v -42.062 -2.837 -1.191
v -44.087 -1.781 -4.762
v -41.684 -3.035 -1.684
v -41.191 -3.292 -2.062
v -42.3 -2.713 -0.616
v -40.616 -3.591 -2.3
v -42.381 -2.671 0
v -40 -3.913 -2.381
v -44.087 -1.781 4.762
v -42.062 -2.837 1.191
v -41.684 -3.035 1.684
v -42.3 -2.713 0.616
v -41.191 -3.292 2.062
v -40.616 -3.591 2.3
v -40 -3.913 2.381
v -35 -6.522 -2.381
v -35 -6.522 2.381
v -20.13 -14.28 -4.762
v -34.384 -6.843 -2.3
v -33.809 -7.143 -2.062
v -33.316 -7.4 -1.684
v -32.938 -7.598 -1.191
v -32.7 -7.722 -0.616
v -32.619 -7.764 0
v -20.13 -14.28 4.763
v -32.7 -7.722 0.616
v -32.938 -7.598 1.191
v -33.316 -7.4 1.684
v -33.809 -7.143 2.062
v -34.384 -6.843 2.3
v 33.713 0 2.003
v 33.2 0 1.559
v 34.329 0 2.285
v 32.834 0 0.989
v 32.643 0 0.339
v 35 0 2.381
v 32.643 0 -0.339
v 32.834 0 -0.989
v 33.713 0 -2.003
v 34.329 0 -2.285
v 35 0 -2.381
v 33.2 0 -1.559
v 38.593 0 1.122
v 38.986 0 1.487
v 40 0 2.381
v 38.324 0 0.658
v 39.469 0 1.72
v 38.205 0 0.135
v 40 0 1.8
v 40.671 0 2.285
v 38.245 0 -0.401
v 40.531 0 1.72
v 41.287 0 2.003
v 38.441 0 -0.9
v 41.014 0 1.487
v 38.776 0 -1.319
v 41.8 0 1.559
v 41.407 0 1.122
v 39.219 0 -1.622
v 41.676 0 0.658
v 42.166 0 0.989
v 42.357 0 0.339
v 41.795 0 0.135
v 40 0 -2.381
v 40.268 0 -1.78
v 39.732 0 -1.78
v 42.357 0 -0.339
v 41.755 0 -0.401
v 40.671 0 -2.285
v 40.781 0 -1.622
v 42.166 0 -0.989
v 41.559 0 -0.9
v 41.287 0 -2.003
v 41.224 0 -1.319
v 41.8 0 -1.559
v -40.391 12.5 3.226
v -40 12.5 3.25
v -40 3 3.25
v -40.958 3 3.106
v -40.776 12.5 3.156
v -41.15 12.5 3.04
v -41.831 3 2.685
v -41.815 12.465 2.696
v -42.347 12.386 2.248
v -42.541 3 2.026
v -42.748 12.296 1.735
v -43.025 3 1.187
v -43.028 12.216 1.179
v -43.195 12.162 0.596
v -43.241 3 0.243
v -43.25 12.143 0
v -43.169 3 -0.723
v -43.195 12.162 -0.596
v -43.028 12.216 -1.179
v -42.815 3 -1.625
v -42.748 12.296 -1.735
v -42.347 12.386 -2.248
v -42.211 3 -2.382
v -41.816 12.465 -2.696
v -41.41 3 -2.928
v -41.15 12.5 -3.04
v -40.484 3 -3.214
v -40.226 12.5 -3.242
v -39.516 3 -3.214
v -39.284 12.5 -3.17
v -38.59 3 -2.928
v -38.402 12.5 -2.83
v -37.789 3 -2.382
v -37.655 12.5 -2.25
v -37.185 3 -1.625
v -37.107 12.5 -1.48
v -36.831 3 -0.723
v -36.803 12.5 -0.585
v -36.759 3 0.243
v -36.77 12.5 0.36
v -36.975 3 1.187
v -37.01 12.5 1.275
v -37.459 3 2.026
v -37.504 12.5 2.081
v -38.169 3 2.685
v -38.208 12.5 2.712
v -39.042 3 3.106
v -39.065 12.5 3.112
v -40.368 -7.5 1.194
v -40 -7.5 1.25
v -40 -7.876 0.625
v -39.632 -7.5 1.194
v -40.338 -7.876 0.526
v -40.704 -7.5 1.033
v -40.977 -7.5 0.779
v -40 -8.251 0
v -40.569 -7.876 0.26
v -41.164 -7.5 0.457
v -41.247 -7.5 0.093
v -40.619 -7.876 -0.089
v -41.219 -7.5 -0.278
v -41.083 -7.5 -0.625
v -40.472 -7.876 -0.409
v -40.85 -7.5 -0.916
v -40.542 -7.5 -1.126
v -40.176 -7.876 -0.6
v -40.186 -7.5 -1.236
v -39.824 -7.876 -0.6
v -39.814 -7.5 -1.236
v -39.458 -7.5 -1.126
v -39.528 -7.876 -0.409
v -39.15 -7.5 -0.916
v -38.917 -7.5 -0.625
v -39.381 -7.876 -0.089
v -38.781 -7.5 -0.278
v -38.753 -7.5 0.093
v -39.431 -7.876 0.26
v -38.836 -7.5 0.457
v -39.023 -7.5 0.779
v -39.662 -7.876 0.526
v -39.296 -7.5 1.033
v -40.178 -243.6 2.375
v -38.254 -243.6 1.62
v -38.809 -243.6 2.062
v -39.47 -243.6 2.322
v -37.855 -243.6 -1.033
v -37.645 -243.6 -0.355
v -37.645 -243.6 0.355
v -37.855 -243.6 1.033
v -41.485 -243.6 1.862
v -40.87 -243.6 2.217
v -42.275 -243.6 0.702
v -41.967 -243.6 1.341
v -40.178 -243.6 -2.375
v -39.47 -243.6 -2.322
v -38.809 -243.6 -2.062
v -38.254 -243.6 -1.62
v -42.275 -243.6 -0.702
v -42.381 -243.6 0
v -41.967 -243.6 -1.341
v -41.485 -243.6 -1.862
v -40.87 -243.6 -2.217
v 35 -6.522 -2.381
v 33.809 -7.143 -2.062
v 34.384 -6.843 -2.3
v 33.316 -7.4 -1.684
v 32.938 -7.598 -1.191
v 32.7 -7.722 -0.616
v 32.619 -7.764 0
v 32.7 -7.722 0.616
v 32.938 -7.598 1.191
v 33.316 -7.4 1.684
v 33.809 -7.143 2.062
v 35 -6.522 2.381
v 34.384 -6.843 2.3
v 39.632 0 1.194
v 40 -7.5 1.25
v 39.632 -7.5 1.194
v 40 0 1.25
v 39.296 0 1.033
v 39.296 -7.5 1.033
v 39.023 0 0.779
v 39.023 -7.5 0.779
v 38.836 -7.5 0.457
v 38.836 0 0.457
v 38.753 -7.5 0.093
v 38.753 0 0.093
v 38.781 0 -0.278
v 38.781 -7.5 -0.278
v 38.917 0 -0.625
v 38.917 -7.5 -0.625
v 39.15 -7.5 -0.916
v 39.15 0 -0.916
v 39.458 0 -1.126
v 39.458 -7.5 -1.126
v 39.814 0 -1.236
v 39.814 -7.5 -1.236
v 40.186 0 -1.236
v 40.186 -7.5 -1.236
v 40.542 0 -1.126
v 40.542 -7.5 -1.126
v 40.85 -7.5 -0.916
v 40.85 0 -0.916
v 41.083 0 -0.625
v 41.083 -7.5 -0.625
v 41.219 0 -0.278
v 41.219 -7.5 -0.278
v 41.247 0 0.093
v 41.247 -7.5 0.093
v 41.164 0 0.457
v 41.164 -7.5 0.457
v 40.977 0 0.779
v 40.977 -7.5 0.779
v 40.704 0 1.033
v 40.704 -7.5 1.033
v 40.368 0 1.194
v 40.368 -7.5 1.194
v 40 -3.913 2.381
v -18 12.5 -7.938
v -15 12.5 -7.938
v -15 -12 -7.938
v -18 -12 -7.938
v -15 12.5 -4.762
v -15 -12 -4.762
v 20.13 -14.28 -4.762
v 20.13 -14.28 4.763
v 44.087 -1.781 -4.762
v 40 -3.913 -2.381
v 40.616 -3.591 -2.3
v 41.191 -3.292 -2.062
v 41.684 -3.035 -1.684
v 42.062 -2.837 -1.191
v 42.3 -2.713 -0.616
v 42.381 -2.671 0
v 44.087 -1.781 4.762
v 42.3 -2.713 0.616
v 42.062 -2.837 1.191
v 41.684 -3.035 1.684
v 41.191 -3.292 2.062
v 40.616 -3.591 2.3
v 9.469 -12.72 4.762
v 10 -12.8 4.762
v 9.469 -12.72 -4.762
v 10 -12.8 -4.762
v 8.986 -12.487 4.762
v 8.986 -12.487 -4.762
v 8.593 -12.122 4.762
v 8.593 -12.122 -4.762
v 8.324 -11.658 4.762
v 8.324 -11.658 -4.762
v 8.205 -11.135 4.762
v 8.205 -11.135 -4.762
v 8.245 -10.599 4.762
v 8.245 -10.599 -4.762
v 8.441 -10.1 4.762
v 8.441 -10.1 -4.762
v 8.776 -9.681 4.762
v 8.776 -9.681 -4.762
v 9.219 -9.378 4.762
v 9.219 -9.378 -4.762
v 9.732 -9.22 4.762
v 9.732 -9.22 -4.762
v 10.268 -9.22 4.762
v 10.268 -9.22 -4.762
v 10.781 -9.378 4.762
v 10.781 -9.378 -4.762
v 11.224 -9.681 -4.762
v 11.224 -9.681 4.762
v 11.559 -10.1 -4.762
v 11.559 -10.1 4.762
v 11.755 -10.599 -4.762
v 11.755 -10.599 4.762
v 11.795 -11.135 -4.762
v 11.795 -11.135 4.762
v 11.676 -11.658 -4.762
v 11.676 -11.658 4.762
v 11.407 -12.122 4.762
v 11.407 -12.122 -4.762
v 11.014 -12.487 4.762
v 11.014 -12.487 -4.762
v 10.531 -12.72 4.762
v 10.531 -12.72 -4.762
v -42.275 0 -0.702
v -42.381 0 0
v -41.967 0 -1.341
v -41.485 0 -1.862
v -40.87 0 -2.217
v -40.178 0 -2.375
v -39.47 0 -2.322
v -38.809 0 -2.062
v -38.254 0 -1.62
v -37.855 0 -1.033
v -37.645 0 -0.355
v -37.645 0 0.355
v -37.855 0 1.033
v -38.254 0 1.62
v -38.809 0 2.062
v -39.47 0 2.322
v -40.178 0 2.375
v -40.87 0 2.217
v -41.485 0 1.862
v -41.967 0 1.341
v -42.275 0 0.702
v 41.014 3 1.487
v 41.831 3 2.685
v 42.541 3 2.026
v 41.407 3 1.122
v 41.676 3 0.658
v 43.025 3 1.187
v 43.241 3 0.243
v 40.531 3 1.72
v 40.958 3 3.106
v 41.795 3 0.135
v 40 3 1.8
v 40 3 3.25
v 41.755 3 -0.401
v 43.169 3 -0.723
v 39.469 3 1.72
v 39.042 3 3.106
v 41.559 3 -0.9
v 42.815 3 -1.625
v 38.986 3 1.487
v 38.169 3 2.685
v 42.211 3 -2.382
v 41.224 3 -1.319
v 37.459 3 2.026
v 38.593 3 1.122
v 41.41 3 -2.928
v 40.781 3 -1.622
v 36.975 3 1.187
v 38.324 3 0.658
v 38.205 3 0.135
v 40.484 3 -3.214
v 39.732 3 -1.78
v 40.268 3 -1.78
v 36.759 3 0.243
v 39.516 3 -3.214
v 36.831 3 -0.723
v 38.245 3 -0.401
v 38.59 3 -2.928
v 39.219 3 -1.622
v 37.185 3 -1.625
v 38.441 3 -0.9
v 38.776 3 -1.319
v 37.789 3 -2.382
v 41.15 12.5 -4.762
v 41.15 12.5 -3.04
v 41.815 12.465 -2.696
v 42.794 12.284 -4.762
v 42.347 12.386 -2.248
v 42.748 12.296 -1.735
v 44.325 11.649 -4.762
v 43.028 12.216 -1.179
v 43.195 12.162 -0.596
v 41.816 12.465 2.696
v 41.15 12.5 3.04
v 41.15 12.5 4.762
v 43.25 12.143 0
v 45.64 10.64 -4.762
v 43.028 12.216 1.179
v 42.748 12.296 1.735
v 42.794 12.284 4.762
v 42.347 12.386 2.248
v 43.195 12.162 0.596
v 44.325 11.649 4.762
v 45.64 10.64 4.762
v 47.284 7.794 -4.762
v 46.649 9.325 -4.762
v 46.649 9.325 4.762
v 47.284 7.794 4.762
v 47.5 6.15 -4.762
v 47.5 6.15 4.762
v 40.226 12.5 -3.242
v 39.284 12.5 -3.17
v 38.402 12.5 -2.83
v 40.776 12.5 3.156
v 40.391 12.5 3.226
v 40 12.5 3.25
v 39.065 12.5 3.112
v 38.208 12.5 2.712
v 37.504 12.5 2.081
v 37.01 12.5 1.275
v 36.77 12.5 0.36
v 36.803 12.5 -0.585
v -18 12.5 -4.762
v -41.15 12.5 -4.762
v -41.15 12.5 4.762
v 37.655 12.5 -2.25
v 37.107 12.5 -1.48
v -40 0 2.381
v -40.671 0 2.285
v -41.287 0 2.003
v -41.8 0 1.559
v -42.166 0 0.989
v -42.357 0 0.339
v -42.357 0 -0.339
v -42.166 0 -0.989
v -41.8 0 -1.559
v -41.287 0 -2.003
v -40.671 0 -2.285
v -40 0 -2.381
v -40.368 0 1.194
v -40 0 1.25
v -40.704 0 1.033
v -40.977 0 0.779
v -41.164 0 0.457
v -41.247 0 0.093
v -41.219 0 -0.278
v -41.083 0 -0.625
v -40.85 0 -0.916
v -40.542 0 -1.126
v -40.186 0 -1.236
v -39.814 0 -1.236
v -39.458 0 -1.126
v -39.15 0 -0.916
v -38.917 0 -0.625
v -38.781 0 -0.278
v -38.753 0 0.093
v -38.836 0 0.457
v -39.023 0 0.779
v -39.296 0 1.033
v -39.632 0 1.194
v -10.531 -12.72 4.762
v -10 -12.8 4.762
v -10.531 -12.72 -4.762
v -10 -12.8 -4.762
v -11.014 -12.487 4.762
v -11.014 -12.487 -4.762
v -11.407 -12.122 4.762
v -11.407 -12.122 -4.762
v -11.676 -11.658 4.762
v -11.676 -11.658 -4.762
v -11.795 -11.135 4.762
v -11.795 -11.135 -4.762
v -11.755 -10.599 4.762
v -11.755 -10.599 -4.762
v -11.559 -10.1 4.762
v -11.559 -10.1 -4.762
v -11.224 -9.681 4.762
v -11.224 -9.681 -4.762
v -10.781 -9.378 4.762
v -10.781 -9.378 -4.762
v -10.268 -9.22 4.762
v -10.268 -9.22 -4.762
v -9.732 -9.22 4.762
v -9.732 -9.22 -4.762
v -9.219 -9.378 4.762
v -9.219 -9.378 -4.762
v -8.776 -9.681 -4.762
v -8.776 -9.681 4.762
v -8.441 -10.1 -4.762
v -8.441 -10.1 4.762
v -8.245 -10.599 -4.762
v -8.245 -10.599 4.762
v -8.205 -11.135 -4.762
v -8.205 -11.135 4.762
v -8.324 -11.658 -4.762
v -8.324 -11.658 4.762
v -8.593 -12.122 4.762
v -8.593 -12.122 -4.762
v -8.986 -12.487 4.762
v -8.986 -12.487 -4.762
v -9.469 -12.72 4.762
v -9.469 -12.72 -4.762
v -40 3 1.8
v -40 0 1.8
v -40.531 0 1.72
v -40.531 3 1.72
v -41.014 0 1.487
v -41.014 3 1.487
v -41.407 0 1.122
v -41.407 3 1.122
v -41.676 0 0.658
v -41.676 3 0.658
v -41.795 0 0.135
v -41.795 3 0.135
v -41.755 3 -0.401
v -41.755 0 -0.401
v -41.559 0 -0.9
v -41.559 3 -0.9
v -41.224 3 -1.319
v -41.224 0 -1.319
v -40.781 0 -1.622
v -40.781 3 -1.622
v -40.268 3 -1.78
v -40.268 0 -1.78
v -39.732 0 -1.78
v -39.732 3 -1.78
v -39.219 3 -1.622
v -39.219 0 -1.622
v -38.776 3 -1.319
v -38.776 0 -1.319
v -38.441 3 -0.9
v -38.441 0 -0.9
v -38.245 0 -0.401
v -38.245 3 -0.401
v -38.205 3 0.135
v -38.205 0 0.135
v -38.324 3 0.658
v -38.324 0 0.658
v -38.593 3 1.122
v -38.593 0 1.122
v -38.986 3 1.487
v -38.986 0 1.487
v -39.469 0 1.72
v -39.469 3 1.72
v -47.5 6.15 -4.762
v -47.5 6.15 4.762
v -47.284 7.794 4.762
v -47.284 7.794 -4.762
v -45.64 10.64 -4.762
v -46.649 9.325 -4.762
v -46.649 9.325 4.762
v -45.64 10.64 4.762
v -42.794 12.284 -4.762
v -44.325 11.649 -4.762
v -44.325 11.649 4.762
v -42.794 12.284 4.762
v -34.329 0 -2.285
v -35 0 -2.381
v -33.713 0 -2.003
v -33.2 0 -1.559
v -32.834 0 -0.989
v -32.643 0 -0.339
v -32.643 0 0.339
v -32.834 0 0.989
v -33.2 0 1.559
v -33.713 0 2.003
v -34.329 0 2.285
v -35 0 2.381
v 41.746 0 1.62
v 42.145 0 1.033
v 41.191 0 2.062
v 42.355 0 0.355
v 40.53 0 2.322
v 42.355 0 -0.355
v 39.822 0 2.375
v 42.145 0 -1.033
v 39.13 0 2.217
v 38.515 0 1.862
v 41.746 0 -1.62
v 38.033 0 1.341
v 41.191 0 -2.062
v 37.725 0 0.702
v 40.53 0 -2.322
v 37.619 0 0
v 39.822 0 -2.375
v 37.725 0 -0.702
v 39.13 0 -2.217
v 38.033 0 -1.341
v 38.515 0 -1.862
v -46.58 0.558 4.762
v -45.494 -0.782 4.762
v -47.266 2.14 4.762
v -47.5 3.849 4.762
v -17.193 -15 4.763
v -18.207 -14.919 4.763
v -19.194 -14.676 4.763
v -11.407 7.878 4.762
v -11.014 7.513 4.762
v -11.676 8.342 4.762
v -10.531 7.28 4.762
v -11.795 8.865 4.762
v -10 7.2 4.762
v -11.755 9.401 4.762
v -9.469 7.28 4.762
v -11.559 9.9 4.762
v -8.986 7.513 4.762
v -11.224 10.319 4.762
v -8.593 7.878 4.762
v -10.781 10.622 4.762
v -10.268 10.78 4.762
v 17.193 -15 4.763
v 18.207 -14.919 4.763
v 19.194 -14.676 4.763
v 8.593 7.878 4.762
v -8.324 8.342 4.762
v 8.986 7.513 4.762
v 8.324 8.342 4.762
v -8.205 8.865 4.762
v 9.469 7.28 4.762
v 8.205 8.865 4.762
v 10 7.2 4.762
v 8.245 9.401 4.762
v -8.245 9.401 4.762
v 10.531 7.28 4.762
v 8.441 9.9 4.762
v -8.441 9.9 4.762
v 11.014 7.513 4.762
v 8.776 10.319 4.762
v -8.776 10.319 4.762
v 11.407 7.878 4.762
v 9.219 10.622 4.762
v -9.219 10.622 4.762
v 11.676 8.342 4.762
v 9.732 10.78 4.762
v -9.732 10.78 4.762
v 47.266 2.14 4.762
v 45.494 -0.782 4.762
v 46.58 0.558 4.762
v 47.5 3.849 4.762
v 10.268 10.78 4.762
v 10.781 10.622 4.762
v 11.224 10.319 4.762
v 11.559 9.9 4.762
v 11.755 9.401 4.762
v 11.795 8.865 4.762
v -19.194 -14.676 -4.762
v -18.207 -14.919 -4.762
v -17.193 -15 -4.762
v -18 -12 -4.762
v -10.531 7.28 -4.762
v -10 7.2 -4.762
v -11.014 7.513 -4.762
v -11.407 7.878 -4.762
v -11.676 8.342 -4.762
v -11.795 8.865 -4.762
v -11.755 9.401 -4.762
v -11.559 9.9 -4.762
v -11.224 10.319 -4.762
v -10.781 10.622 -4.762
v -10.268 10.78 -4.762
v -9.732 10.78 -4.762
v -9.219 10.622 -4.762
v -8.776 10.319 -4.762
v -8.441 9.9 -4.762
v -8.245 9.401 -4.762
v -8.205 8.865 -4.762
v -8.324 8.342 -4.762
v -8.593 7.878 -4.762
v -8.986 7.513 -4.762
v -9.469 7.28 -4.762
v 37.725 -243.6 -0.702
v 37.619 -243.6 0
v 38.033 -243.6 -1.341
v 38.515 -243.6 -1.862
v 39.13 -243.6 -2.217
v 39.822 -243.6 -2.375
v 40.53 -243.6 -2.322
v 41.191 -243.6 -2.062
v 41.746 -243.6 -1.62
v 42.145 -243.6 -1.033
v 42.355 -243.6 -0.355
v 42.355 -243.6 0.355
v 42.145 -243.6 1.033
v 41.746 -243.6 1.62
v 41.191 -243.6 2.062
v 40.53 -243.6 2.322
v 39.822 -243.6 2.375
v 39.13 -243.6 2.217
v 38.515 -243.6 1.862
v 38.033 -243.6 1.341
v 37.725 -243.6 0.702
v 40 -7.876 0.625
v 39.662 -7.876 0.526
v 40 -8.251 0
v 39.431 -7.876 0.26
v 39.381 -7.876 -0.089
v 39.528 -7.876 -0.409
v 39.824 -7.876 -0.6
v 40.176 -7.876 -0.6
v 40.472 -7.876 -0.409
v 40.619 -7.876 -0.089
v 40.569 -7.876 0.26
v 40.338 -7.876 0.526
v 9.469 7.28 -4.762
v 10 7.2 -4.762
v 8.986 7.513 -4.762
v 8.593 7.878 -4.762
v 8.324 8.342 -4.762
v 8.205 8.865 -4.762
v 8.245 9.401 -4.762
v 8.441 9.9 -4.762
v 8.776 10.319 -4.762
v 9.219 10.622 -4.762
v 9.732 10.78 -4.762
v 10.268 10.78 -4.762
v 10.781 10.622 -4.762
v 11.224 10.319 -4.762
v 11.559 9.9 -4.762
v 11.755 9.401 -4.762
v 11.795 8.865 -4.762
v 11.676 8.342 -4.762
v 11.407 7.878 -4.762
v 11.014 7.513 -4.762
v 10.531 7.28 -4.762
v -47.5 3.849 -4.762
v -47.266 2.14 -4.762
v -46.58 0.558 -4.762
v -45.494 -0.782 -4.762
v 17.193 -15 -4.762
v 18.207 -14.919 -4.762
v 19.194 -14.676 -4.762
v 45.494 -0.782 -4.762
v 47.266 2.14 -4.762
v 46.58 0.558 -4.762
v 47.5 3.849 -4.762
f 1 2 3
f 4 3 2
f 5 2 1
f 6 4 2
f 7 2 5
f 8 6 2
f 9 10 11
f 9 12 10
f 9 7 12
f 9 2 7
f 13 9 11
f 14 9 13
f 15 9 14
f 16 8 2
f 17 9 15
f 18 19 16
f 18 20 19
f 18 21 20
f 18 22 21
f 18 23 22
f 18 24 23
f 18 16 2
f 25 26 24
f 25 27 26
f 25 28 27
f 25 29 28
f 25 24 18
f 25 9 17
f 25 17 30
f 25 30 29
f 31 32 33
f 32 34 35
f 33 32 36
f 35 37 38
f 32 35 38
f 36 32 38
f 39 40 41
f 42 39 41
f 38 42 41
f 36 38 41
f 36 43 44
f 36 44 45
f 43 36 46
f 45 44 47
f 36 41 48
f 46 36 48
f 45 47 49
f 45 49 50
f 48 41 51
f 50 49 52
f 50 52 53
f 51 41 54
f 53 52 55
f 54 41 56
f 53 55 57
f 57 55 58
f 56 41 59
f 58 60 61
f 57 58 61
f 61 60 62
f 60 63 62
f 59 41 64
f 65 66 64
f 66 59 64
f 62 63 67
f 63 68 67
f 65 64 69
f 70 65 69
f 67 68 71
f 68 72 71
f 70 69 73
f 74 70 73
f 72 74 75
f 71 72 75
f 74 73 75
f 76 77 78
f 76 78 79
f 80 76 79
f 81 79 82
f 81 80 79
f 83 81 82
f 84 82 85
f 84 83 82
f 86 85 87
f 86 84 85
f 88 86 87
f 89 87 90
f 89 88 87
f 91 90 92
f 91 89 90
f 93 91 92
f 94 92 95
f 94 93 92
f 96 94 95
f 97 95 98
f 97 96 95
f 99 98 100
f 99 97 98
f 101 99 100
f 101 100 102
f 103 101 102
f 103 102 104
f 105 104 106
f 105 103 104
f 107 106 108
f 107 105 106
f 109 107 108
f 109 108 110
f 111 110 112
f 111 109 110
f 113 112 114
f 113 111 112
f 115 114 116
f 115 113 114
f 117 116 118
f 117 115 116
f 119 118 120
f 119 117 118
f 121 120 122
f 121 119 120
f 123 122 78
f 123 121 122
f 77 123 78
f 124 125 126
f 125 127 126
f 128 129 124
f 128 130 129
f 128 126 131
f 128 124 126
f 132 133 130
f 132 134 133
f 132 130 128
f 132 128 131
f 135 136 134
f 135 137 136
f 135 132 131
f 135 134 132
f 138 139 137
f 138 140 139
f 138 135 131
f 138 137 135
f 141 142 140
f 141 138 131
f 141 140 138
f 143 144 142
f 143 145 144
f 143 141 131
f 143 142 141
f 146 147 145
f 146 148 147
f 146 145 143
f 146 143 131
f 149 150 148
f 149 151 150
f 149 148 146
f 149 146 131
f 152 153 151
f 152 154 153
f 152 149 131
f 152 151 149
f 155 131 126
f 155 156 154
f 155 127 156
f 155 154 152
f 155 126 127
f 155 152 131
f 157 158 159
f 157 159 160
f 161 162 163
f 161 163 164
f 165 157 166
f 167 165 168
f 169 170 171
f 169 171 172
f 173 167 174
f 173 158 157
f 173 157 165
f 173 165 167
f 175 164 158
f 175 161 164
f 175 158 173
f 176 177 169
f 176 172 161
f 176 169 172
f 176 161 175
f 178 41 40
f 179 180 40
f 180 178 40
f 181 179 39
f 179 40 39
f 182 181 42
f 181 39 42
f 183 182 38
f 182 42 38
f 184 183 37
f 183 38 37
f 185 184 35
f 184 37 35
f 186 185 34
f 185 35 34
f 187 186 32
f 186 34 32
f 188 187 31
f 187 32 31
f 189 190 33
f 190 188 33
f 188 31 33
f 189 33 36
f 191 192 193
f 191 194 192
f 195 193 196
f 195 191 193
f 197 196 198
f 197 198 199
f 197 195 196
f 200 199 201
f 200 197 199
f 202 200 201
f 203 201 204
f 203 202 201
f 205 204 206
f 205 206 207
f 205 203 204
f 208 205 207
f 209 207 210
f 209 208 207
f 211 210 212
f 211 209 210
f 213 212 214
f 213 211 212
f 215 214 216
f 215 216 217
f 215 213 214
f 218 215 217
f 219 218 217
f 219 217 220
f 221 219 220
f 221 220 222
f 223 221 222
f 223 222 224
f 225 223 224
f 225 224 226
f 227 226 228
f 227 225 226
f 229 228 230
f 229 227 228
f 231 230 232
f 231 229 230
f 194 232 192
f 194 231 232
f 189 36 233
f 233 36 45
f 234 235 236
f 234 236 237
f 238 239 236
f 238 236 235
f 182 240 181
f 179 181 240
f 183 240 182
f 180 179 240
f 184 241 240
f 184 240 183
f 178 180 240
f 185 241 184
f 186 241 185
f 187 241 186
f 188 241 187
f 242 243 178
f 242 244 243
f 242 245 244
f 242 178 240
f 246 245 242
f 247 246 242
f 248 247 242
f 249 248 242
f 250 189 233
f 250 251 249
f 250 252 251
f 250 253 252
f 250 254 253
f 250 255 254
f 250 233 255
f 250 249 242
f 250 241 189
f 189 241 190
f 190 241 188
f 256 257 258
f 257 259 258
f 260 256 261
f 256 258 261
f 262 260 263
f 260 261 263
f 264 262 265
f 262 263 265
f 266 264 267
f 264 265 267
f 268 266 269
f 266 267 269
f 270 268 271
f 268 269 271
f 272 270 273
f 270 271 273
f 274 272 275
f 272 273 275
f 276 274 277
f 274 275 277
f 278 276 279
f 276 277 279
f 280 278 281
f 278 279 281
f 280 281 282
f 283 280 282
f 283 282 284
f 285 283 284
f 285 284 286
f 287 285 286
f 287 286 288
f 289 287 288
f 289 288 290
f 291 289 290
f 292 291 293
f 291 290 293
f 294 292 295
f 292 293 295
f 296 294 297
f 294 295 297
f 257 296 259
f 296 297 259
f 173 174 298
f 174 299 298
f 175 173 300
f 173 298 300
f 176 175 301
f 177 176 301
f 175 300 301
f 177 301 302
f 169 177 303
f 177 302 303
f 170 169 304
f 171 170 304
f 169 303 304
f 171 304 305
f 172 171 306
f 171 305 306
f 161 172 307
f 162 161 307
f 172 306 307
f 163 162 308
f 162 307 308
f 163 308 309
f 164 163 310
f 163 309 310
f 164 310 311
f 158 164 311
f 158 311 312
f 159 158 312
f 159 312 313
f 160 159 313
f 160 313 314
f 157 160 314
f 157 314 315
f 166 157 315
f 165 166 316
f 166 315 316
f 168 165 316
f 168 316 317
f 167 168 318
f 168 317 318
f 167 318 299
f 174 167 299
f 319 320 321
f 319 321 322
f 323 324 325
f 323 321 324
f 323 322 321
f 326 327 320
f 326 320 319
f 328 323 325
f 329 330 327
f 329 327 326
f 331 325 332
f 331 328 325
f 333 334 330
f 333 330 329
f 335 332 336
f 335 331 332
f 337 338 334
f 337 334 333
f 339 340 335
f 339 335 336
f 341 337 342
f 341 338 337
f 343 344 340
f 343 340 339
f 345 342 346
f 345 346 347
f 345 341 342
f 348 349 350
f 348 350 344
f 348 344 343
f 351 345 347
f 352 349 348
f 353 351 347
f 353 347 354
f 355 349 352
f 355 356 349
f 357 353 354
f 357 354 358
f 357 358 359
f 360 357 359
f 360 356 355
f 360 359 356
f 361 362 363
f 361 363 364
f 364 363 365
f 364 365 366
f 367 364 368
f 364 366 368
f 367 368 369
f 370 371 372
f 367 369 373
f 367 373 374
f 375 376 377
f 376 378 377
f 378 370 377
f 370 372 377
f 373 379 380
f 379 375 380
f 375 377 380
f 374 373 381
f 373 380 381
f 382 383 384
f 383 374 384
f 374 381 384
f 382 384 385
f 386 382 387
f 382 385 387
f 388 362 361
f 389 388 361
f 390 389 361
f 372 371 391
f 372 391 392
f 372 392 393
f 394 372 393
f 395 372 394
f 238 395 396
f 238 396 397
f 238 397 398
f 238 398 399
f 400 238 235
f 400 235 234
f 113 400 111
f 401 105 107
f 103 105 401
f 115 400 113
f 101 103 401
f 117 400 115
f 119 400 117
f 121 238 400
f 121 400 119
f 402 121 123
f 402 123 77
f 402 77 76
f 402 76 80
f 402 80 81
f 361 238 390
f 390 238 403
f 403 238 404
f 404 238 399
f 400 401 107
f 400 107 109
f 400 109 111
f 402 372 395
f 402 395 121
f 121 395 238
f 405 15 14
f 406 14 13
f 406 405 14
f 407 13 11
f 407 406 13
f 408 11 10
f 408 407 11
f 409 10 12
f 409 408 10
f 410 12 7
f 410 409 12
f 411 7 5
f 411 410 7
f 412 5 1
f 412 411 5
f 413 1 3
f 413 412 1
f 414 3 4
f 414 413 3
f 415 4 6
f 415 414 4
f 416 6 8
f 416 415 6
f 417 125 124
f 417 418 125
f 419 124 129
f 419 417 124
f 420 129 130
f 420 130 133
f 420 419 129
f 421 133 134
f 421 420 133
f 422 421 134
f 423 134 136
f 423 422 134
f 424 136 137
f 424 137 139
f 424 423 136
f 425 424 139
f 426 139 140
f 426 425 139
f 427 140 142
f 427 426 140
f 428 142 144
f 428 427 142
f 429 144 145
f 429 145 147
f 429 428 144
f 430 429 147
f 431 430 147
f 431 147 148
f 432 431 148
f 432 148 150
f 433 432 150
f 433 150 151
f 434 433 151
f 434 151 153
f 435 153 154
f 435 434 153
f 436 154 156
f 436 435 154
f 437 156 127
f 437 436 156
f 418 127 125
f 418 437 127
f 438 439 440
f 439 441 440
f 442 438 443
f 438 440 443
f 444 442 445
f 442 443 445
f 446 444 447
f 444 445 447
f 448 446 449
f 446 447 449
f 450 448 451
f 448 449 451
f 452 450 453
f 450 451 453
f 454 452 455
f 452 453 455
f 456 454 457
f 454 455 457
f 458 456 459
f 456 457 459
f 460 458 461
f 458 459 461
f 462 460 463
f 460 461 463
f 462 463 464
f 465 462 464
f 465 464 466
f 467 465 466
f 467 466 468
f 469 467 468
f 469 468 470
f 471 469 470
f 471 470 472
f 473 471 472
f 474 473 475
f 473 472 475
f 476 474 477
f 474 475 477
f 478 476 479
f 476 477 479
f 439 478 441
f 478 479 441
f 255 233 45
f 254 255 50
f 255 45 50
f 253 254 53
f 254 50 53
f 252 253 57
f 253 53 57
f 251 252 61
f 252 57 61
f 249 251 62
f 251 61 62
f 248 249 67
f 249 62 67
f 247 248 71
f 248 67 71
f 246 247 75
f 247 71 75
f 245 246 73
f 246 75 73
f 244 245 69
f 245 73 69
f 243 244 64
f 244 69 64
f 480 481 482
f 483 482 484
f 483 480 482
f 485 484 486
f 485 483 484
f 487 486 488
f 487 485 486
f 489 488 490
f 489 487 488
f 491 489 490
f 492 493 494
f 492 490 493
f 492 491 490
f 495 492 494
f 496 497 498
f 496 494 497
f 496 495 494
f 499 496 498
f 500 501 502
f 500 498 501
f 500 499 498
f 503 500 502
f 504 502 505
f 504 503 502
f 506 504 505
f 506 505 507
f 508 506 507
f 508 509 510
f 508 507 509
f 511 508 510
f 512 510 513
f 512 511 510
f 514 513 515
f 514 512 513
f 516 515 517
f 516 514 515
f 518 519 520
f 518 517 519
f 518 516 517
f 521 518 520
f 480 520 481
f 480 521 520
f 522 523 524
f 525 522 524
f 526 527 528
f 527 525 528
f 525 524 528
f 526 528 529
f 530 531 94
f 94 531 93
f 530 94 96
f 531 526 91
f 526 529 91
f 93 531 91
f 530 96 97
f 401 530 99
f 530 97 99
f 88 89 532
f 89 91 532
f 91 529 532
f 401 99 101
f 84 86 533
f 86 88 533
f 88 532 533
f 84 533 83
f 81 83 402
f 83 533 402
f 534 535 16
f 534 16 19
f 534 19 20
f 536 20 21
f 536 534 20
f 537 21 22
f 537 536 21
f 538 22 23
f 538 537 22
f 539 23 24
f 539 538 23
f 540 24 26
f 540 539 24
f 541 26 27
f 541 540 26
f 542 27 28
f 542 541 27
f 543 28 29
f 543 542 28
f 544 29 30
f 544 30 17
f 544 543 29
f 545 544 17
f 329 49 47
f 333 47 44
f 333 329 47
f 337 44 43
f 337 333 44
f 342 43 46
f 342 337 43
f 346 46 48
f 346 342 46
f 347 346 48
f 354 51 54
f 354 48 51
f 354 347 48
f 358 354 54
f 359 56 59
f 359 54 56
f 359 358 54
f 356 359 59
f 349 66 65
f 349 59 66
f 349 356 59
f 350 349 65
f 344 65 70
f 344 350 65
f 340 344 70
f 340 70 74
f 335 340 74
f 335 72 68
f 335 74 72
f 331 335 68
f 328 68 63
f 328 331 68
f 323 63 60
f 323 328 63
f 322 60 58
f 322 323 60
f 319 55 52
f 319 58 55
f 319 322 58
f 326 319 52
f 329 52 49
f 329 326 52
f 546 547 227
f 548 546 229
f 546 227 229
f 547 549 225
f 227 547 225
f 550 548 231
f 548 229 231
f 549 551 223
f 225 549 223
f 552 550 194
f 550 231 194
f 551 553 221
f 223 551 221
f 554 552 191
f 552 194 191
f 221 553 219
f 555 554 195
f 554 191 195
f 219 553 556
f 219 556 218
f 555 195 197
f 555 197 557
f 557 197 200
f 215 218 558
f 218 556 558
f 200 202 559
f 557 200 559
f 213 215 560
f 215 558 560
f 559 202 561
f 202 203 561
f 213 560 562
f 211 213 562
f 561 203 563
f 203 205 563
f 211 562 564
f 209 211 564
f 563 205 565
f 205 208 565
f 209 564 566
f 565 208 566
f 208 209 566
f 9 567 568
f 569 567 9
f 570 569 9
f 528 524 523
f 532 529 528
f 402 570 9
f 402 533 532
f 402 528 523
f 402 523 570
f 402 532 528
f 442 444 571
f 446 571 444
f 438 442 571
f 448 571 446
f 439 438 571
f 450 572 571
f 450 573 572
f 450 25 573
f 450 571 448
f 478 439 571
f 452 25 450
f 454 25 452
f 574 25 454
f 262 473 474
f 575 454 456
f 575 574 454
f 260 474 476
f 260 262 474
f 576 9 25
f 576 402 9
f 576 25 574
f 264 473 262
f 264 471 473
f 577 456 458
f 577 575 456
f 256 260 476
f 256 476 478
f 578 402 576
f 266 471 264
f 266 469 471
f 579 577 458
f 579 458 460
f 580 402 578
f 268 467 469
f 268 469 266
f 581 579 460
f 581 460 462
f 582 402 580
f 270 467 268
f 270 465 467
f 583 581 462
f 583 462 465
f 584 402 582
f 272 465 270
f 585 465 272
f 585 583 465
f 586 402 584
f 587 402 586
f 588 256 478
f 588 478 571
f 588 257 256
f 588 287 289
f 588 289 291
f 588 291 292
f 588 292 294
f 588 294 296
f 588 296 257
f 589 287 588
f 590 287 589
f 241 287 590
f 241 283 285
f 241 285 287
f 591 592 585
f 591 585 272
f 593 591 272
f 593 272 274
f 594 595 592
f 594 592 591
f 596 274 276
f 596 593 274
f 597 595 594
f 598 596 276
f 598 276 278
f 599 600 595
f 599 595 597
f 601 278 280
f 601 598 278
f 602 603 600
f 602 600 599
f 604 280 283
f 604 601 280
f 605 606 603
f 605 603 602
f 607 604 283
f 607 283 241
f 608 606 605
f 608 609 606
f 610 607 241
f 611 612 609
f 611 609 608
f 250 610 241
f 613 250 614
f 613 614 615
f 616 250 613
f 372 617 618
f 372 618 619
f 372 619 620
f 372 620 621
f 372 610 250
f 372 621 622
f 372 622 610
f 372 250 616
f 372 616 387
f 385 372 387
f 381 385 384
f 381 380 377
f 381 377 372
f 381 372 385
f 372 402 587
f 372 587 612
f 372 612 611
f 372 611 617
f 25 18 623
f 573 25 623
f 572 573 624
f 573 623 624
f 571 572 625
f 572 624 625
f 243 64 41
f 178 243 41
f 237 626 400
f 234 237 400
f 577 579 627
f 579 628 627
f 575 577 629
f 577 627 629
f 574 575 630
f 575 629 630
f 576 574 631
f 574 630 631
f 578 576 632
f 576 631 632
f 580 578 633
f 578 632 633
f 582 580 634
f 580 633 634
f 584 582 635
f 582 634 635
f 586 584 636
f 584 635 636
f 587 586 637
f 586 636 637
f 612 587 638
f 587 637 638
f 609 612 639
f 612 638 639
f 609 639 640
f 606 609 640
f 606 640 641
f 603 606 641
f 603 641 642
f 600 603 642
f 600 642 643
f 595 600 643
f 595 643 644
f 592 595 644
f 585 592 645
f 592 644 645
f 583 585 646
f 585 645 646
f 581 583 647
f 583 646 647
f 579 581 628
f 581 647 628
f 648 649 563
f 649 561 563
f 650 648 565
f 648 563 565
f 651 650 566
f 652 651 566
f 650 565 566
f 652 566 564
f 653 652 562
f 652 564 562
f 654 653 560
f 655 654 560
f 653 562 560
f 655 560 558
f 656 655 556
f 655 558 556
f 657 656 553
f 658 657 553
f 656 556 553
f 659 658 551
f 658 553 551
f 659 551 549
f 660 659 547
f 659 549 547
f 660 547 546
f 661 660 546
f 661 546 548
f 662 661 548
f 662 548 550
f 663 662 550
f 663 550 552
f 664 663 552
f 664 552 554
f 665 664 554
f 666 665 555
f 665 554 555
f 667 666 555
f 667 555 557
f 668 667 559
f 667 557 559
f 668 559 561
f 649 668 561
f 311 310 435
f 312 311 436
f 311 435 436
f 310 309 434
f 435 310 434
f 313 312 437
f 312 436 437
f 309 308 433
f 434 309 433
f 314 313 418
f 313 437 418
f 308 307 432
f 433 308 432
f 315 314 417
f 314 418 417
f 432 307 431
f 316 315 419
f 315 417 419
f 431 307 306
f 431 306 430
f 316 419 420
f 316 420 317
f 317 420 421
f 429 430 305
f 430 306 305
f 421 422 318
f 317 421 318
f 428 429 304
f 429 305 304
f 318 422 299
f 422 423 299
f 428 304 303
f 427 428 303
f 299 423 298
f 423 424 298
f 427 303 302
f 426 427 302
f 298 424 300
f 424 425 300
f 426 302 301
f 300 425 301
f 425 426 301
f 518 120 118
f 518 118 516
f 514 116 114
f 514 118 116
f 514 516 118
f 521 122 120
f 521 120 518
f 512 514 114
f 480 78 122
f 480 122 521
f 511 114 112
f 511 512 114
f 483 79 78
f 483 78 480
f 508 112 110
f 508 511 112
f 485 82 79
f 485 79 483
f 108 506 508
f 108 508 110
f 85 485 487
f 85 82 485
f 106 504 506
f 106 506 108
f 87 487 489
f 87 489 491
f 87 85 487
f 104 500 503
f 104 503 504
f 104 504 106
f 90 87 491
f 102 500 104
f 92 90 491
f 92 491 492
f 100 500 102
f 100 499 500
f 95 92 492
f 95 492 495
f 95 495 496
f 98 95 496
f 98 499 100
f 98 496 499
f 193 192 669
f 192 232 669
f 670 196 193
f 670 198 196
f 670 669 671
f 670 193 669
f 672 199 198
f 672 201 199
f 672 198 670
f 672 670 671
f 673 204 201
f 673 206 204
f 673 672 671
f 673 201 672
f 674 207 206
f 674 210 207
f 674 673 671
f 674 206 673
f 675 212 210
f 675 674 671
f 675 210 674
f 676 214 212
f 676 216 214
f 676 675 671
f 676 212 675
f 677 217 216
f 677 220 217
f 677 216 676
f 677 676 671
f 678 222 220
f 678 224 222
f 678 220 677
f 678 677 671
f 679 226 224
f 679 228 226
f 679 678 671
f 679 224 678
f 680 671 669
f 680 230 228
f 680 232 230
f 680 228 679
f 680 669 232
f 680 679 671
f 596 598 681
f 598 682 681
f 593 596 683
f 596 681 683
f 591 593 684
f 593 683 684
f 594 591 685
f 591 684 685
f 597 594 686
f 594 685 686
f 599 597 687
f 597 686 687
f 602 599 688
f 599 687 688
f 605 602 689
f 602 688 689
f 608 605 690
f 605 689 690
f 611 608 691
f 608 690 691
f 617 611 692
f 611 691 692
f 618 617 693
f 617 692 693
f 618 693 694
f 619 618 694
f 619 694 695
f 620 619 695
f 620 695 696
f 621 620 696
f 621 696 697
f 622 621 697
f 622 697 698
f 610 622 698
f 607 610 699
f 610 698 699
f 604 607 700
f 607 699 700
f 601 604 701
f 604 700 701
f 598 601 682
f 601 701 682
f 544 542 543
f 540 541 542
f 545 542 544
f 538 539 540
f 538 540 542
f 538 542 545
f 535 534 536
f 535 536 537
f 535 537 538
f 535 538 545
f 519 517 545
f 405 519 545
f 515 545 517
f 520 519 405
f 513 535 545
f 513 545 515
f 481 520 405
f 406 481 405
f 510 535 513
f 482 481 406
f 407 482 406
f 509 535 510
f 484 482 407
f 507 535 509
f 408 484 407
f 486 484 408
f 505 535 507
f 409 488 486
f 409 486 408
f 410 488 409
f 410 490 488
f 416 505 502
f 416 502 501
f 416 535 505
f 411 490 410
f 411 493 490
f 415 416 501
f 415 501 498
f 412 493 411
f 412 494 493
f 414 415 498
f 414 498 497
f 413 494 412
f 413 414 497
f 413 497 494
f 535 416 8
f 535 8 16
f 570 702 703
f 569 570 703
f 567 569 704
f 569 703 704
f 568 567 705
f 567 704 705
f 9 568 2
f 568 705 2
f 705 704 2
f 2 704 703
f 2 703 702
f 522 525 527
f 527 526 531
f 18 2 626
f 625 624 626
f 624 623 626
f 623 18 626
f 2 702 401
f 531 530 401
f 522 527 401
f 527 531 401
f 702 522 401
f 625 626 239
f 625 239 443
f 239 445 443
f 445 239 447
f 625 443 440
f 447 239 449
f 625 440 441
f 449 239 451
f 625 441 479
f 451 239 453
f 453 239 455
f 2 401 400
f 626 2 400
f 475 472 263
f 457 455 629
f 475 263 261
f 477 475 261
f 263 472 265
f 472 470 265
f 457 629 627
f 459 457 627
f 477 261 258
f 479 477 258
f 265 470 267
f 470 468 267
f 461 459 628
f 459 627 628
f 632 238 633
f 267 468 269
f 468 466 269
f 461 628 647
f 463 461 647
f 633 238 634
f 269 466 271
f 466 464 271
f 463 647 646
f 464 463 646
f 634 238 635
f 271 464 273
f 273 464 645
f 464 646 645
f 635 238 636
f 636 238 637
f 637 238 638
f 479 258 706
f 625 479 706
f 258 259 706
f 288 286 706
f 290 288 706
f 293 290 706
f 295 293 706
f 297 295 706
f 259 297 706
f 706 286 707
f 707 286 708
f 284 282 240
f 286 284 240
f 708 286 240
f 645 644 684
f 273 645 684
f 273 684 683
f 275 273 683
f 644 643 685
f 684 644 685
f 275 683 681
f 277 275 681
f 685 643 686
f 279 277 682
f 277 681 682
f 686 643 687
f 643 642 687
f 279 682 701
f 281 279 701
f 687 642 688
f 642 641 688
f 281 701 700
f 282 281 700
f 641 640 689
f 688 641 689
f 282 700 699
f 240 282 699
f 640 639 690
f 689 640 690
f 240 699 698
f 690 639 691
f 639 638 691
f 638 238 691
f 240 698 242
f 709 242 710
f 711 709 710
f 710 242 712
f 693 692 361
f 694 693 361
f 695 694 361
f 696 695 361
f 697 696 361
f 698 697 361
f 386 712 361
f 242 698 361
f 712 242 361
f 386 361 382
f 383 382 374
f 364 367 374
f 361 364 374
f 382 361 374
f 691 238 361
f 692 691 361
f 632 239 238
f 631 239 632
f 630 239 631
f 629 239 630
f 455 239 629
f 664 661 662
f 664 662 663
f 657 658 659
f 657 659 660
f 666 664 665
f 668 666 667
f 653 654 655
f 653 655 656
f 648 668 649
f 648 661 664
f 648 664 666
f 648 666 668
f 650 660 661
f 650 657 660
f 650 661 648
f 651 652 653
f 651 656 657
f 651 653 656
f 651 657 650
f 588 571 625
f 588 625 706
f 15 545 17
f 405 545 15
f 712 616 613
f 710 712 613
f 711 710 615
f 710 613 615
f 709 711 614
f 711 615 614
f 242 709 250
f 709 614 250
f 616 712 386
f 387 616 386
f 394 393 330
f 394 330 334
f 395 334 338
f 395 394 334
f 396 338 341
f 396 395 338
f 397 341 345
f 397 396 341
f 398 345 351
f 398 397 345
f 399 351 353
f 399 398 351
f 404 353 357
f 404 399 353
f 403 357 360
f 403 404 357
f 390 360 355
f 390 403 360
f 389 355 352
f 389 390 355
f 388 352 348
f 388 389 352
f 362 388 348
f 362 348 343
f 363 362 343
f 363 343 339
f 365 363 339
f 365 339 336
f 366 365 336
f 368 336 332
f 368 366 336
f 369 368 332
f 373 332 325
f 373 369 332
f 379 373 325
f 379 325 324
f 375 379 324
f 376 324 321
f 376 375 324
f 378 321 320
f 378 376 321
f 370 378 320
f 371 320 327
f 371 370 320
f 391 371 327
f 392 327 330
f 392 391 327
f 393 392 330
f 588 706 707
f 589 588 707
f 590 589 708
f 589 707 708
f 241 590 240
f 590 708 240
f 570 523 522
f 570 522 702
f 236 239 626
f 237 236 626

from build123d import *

# Parameters (mm, degrees)
BOSS_EXTRUDE1_DEPTH            = 4.7625
CUT_EXTRUDE1_DEPTH             = 10
SKETCH4_W                      = 2.38125
SKETCH4_H                      = 243.6
SKETCH4_3_W                    = 2.38125
SKETCH4_3_H                    = 243.6
SKETCH6_W                      = 1.8
SKETCH6_H                      = 9.525
M3_CLEARANCE_HOLE1_AT_2_COUNT  = 2
M3_CLEARANCE_HOLE1_AT_2_PITCH  = 20
M3_CLEARANCE_HOLE1_AT_3_COUNT  = 2
M3_CLEARANCE_HOLE1_AT_3_PITCH  = 28.284271247
M3_CLEARANCE_HOLE1_AT_4_COUNT  = 2
M3_CLEARANCE_HOLE1_AT_4_PITCH  = 20
CBORE_FOR_M3_SHCS2_AT_2_COUNT  = 2
CBORE_FOR_M3_SHCS2_AT_2_PITCH  = 80
M3X0_5_TAPPED_HOLE1_AT_2_COUNT = 2
M3X0_5_TAPPED_HOLE1_AT_2_PITCH = 80
FILLET1_R                      = 6.35
SKETCH16_W                     = 3
SKETCH16_H                     = 24.5
BOSS_EXTRUDE2_DEPTH            = 3.175


with BuildPart() as part:
    # Sketch3 → Boss-Extrude1 (new, symmetric)
    with BuildSketch(Plane.XY):
        Polygon((-47.5, 12.5), (-47.5, 0), (-18.75, -15), (18.75, -15), (47.5, 0), (47.5, 12.5), align=None)
    extrude(amount=BOSS_EXTRUDE1_DEPTH, both=True)

    # Sketch10 → Cut-Extrude1 (cut)
    with BuildSketch(Plane(origin=(0, 0, 0), x_dir=(1, 0, 0), z_dir=(0, 1, 0))):
        with BuildLine():
            Line((40, 2.38125), (35, 2.38125))
            ThreePointArc((35, 2.38125), (32.61875, 0), (35, -2.38125))
            Line((35, -2.38125), (40, -2.38125))
            ThreePointArc((40, -2.38125), (42.38125, 0), (40, 2.38125))
        make_face()
        with BuildLine():
            Line((-40, 2.38125), (-35, 2.38125))
            ThreePointArc((-35, 2.38125), (-32.61875, 0), (-35, -2.38125))
            Line((-35, -2.38125), (-40, -2.38125))
            ThreePointArc((-40, -2.38125), (-42.38125, 0), (-40, 2.38125))
        make_face()
    extrude(amount=-CUT_EXTRUDE1_DEPTH, mode=Mode.SUBTRACT)

    # Sketch6 → M3 Clearance Hole1 (revolve, cut)
    with BuildSketch(Plane(origin=(-10, 9, 4.7625), x_dir=(0, -1, 0), z_dir=(1, 0, 0))):
        with Locations((0.9, 4.7625)):
            Rectangle(SKETCH6_W, SKETCH6_H)
    m3_clearance_hole1 = revolve(axis=Axis((-10, 9, 11.1125), (0, 0, -1)), mode=Mode.SUBTRACT)

    # M3 Clearance Hole1 at 2: M3 Clearance Hole1 ×2
    with Locations(*[(0, -i * M3_CLEARANCE_HOLE1_AT_2_PITCH, 0) for i in range(1, M3_CLEARANCE_HOLE1_AT_2_COUNT)]):
        add(m3_clearance_hole1, mode=Mode.SUBTRACT)

    # M3 Clearance Hole1 at 3: M3 Clearance Hole1 ×2
    with Locations(*[Vector(0.707106781186549, -0.707106781186546, 0) * (i * M3_CLEARANCE_HOLE1_AT_3_PITCH) for i in range(1, M3_CLEARANCE_HOLE1_AT_3_COUNT)]):
        add(m3_clearance_hole1, mode=Mode.SUBTRACT)

    # M3 Clearance Hole1 at 4: M3 Clearance Hole1 ×2
    with Locations(*[(i * M3_CLEARANCE_HOLE1_AT_4_PITCH, 0, 0) for i in range(1, M3_CLEARANCE_HOLE1_AT_4_COUNT)]):
        add(m3_clearance_hole1, mode=Mode.SUBTRACT)

    # Sketch12 → CBORE for M3 SHCS2 (revolve, cut)
    with BuildSketch(Plane(origin=(-40, 12.5, 0), x_dir=(0, 0, 1), z_dir=(1, 0, 0))):
        Polygon((0, 0), (0, 256.1), (1.8, 256.1), (1.8, 9.5), (3.25, 9.5), (3.25, 0), align=None)
    cbore_for_m3_shcs2 = revolve(axis=Axis((-40, 18.85, 0), (0, -1, 0)), mode=Mode.SUBTRACT)

    # CBORE for M3 SHCS2 at 2: CBORE for M3 SHCS2 ×2
    with Locations(*[(i * CBORE_FOR_M3_SHCS2_AT_2_PITCH, 0, 0) for i in range(1, CBORE_FOR_M3_SHCS2_AT_2_COUNT)]):
        add(cbore_for_m3_shcs2, mode=Mode.SUBTRACT)

    # Fillet1
    # the kernel refuses this fillet: 6.35 mm, written as the material it takes off along each edge
    with BuildSketch(Plane(origin=(47.5, 12.5, 20.6375), x_dir=(-1, 0, 0), z_dir=(0, 0, -1)), Plane(origin=(-47.5, 12.5, 20.6375), x_dir=(0, -1, 0), z_dir=(0, 0, -1))) as fillet1_piece_1:
        with BuildLine():
            CenterArc((FILLET1_R, -FILLET1_R), FILLET1_R, 90, 90)
            Line((0, -FILLET1_R), (0, 0))
            Line((0, 0), (FILLET1_R, 0))
        make_face()
    extrude(amount=41.275, mode=Mode.SUBTRACT)
    with BuildSketch(Plane(origin=(47.5, 0, 14.385678967), x_dir=(0, 1, 0), z_dir=(0, 0, -1)), Plane(origin=(-47.5, 0, -14.385678967), x_dir=(0, 1, 0), z_dir=(0, 0, 1))) as fillet1_piece_2:
        with BuildLine():
            CenterArc((FILLET1_R * 0.606184501832, -FILLET1_R), FILLET1_R, 90, 62.447188423)
            Line((-FILLET1_R * 0.280400344333, -FILLET1_R * 0.537433993305), (0, 0))
            Line((0, 0), (FILLET1_R * 0.606184501832, 0))
        make_face()
    extrude(amount=28.771357933, mode=Mode.SUBTRACT)
    with BuildSketch(Plane(origin=(18.75, -15, -8.654843019), x_dir=(-1, 0, 0), z_dir=(0, 0, 1)), Plane(origin=(-18.75, -15, -8.654843019), x_dir=(-0.8865848461654543, 0.4625660066950205, 0), z_dir=(0, 0, 1))) as fillet1_piece_3:
        with BuildLine():
            CenterArc((FILLET1_R * 0.245186961845, -FILLET1_R), FILLET1_R, 90, 27.552811577)
            Line((-FILLET1_R * 0.21737904485, -FILLET1_R * 0.113415153835), (0, 0))
            Line((0, 0), (FILLET1_R * 0.245186961845, 0))
        make_face()
    extrude(amount=17.309686039, mode=Mode.SUBTRACT)

    # Sketch16 → Boss-Extrude2 (add)
    with BuildSketch(Plane(origin=(0, 0, -4.7625), x_dir=(-1, 0, 0), z_dir=(0, 0, -1))):
        with Locations((16.5, 0.25)):
            Rectangle(SKETCH16_W, SKETCH16_H)
    extrude(amount=BOSS_EXTRUDE2_DEPTH)


with BuildPart() as body_2:
    # Sketch4 → Revolve1 (revolve)
    with BuildSketch(Plane.XY):
        with Locations((-41.190625, -121.8)):
            Rectangle(SKETCH4_W, SKETCH4_H)
    revolve(axis=Axis((-40, -243.6, 0), (0, -1, 0)))

    # Sketch14 → M3x0.5 Tapped Hole1 (revolve, cut)
    with BuildSketch(Plane(origin=(-40, 0, 0), x_dir=(0, 0, 1), z_dir=(1, 0, 0))):
        Polygon((0, 0), (0, 8.251075774), (1.25, 7.5), (1.25, 0), align=None)
    m3x0_5_tapped_hole1 = revolve(axis=Axis((-40, 6.35, 0), (0, -1, 0)), mode=Mode.SUBTRACT)


with BuildPart() as body_3:
    # Sketch4<3> → Revolve2 (revolve)
    with BuildSketch(Plane.XY):
        with Locations((38.809375, -121.8)):
            Rectangle(SKETCH4_3_W, SKETCH4_3_H)
    revolve(axis=Axis((40, -243.6, 0), (0, -1, 0)))

    # M3x0.5 Tapped Hole1 at 2: M3x0.5 Tapped Hole1 ×2
    with Locations(*[(i * M3X0_5_TAPPED_HOLE1_AT_2_PITCH, 0, 0) for i in range(1, M3X0_5_TAPPED_HOLE1_AT_2_COUNT)]):
        add(m3x0_5_tapped_hole1, mode=Mode.SUBTRACT)


solid = Compound([part.part, body_2.part, body_3.part])
